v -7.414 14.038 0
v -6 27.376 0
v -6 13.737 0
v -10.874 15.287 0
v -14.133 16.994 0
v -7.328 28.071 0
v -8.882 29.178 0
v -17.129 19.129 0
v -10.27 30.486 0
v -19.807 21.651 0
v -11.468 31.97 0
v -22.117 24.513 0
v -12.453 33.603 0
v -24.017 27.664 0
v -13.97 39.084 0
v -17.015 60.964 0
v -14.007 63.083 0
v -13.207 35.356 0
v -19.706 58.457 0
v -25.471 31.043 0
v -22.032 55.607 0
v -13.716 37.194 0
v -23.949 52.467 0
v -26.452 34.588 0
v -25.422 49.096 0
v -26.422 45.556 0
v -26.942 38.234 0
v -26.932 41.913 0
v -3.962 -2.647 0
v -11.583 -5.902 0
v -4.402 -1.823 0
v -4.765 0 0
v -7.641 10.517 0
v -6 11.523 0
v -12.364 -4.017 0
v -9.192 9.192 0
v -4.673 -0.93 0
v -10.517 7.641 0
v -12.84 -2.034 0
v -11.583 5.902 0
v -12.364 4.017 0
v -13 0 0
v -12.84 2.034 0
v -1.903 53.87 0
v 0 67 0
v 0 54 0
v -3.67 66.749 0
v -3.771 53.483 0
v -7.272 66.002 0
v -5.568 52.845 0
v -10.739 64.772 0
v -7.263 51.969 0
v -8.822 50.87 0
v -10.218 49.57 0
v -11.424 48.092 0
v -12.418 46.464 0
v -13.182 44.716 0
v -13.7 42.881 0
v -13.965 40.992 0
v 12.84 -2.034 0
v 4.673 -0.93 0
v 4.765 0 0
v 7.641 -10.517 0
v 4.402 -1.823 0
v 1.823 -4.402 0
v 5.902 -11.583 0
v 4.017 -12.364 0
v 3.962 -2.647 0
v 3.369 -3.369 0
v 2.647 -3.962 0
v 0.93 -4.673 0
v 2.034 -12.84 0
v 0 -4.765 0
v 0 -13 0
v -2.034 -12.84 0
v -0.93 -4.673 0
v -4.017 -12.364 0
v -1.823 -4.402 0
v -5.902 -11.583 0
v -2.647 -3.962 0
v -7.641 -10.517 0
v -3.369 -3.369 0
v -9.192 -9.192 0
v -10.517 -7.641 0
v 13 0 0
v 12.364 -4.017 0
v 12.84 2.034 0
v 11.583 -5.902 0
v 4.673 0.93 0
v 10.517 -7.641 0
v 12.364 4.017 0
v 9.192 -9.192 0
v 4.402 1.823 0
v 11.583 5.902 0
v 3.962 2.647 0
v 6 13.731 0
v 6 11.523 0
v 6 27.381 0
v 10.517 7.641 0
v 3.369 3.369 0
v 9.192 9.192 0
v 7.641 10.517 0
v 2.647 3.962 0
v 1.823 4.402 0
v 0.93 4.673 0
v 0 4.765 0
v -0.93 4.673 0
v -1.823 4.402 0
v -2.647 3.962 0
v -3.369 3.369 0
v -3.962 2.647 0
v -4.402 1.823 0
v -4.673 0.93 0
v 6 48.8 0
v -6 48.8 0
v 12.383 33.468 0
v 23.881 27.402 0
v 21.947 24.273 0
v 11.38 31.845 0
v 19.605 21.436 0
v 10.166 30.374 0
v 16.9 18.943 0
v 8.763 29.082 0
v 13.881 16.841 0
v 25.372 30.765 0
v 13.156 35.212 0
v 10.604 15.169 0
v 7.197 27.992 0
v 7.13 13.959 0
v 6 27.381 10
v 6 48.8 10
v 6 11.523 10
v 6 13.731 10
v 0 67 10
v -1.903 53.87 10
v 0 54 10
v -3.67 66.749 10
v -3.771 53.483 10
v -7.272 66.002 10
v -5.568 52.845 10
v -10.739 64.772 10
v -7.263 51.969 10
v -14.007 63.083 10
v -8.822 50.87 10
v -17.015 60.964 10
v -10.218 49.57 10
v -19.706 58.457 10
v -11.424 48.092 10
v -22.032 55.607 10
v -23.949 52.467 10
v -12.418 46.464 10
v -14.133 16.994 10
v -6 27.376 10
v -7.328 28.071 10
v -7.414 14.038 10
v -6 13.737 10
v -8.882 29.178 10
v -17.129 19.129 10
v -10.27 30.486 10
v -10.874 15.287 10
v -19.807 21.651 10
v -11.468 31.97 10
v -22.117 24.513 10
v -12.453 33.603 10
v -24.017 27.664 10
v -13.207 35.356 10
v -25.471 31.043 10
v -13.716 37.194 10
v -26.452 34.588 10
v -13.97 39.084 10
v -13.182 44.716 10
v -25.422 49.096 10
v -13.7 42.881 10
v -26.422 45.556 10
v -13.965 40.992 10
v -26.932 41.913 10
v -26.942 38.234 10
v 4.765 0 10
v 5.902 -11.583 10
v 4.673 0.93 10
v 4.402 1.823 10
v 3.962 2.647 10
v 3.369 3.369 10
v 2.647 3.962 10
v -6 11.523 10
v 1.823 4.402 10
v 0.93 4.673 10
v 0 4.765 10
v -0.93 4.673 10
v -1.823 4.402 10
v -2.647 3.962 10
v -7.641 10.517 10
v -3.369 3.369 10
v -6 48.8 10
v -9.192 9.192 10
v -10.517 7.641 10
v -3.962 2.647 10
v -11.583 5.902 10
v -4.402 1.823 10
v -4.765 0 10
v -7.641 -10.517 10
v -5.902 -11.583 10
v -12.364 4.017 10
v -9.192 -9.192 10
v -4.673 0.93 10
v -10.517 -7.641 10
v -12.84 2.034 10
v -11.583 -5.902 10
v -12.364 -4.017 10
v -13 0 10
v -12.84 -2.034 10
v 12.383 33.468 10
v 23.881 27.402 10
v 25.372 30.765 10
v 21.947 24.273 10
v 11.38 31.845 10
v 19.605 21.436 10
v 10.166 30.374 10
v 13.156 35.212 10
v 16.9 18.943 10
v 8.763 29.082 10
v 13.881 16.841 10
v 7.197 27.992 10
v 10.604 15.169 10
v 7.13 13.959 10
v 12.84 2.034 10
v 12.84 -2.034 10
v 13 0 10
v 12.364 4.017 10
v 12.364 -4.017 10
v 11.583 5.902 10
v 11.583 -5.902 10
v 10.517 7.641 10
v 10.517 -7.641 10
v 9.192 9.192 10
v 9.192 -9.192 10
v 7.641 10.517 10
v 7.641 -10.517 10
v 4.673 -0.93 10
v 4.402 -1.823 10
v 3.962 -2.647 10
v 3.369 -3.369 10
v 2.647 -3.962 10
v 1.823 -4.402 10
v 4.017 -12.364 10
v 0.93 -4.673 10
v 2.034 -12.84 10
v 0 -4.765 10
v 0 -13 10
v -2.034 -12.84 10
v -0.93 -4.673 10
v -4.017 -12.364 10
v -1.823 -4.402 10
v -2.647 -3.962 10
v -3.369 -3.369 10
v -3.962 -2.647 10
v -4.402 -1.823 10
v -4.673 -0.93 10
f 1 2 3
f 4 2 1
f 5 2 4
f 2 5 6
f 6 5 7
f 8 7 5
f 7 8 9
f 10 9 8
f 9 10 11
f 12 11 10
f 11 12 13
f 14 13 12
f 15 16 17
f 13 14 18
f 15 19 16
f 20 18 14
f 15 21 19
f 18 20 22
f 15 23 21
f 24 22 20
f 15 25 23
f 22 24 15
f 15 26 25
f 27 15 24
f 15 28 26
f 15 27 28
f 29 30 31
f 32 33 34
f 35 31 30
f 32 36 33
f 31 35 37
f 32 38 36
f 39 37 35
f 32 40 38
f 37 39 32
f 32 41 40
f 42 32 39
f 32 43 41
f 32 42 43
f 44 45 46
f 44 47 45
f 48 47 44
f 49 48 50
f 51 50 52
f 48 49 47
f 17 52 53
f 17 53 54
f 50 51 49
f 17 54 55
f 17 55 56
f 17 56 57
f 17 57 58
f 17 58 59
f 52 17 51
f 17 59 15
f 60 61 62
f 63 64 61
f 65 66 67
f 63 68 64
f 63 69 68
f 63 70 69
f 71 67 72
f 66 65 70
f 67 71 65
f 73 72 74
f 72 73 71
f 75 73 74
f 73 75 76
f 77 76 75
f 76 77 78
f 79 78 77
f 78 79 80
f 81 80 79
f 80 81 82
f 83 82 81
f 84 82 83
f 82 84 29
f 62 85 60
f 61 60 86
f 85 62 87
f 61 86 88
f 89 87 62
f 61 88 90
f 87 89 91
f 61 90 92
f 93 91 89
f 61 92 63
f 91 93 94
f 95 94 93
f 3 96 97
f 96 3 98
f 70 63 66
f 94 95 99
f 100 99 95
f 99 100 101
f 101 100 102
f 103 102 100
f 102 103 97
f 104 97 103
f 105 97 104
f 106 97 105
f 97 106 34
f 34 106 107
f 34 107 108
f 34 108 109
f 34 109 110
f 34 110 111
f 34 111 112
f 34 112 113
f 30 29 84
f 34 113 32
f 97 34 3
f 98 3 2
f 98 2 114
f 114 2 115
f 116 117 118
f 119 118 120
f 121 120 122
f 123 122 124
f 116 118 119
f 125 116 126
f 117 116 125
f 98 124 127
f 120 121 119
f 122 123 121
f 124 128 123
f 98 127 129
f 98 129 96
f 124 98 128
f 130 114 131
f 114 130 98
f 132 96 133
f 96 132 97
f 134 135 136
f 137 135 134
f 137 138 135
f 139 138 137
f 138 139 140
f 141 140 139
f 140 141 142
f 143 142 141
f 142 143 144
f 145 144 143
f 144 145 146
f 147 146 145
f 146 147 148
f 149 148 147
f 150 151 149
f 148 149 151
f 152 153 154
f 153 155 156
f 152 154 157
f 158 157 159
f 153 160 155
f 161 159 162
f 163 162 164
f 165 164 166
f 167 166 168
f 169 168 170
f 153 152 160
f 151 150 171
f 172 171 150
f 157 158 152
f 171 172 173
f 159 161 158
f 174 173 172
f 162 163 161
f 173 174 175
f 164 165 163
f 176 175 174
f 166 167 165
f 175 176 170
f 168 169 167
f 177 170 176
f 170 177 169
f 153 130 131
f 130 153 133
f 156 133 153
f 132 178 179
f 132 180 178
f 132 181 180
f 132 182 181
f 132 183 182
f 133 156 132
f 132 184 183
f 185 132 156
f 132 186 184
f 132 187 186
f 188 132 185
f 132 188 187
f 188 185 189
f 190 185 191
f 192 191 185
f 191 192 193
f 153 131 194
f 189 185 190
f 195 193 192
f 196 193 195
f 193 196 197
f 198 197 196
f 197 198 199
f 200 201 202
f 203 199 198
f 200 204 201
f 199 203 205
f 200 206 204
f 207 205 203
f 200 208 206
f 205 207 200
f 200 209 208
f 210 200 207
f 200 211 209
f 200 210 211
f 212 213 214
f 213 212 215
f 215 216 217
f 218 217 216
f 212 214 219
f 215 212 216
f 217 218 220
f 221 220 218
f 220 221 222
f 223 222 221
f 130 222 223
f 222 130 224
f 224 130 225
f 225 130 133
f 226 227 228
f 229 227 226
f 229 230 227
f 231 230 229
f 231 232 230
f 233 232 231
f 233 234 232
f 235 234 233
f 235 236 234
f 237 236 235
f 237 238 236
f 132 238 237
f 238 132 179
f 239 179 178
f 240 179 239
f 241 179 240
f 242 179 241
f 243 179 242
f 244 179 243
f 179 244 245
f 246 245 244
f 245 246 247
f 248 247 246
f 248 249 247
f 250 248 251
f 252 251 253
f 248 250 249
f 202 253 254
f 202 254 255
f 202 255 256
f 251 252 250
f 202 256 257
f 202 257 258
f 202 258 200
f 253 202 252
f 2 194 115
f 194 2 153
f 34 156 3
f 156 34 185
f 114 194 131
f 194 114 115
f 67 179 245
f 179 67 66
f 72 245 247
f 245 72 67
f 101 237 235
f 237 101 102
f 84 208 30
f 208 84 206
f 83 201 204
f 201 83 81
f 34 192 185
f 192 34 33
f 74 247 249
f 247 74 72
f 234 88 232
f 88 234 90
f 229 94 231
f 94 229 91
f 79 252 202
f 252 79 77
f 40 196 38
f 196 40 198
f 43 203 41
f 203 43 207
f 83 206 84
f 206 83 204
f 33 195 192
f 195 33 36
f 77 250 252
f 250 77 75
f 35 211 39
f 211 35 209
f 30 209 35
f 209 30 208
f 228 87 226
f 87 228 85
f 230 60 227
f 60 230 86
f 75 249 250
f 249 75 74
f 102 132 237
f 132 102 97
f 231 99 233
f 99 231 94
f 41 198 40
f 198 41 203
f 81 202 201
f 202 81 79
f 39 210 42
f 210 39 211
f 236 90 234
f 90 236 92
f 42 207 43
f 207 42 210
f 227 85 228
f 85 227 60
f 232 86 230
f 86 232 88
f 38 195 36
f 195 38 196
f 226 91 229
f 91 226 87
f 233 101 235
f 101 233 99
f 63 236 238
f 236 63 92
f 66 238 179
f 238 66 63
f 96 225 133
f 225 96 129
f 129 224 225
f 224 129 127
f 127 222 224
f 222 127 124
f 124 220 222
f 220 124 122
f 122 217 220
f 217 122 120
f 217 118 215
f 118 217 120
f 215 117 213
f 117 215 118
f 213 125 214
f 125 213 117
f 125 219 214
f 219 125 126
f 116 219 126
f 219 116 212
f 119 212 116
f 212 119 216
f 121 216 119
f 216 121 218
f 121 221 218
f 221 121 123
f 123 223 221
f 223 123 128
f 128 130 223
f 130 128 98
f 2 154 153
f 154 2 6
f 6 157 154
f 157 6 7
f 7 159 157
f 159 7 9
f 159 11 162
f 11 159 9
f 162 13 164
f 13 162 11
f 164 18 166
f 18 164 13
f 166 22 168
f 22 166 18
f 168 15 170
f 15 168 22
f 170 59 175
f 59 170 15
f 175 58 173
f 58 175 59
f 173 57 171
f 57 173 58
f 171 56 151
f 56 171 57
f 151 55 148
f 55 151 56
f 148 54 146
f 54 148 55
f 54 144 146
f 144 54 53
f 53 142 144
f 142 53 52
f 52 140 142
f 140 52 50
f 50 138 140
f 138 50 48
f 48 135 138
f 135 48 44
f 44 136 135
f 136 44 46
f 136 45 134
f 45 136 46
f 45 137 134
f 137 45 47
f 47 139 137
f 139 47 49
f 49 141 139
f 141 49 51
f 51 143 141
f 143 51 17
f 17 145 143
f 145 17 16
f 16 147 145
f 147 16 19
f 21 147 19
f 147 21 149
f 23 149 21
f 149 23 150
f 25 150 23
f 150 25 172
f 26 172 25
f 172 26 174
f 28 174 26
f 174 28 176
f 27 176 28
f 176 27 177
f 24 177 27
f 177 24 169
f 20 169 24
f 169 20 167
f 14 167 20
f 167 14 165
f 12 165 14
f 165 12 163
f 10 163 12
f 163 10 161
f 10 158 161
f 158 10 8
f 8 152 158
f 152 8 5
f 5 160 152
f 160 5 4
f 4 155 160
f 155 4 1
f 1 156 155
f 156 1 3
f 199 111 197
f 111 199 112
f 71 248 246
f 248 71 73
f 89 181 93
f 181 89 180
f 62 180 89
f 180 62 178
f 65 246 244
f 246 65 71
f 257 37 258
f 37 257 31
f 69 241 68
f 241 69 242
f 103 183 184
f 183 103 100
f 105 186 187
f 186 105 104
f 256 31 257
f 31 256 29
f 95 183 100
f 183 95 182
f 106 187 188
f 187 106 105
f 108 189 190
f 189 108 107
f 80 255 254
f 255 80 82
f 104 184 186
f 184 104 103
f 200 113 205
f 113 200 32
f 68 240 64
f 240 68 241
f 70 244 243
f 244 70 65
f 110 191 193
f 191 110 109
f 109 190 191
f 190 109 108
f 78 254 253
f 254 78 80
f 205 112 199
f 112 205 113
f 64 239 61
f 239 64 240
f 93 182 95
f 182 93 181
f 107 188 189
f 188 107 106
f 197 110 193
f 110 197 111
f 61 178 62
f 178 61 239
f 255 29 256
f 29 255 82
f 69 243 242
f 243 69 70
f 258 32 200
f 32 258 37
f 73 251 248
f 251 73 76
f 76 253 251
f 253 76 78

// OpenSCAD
$fn = 32;
// ----------------------------------------------------------------------
// Hook: 80 mm shank into a 14 mm curl, 10 mm thick
// ----------------------------------------------------------------------

// --- parameters (mm) ---
shank_len = 80;           // shank length from the boss centre
shank_w = 12;             // shank width
boss_d = 26;              // boss diameter
bore_d = 9.53;            // boss bore
curl_in = 14;             // curl inner radius
curl_out = 27;            // curl outer radius
curl_sweep = 250;         // curl sweep angle
hook_t = 10;              // hook thickness

shank_profile = [[-6, 48.8], [6, 48.8], [6, 11], [-6, 11]];
boss_profile = [[13, 0], [12.84, 2.034], [12.364, 4.017], [11.583, 5.902], [10.517, 7.641], [9.192, 9.192], [7.641, 10.517], [5.902, 11.583], [4.017, 12.364], [2.034, 12.84], [0, 13], [-2.034, 12.84], [-4.017, 12.364], [-5.902, 11.583], [-7.641, 10.517], [-9.192, 9.192], [-10.517, 7.641], [-11.583, 5.902], [-12.364, 4.017], [-12.84, 2.034], [-13, 0], [-12.84, -2.034], [-12.364, -4.017], [-11.583, -5.902], [-10.517, -7.641], [-9.192, -9.192], [-7.641, -10.517], [-5.902, -11.583], [-4.017, -12.364], [-2.034, -12.84], [0, -13], [2.034, -12.84], [4.017, -12.364], [5.902, -11.583], [7.641, -10.517], [9.192, -9.192], [10.517, -7.641], [11.583, -5.902], [12.364, -4.017], [12.84, -2.034]];
curl_profile = [[0, 67], [-3.67, 66.749], [-7.272, 66.002], [-10.739, 64.772], [-14.007, 63.083], [-17.015, 60.964], [-19.706, 58.457], [-22.032, 55.607], [-23.949, 52.467], [-25.422, 49.096], [-26.422, 45.556], [-26.932, 41.913], [-26.942, 38.234], [-26.452, 34.588], [-25.471, 31.043], [-24.017, 27.664], [-22.117, 24.513], [-19.807, 21.651], [-17.129, 19.129], [-14.133, 16.994], [-10.874, 15.287], [-7.414, 14.038], [-3.816, 13.271], [-0.147, 13], [3.524, 13.231], [7.13, 13.959], [10.604, 15.169], [13.881, 16.841], [16.9, 18.943], [19.605, 21.436], [21.947, 24.273], [23.881, 27.402], [25.372, 30.765], [13.156, 35.212], [12.383, 33.468], [11.38, 31.845], [10.166, 30.374], [8.763, 29.082], [7.197, 27.992], [5.498, 27.125], [3.697, 26.497], [1.827, 26.12], [-0.076, 26], [-1.979, 26.141], [-3.844, 26.538], [-5.638, 27.186], [-7.328, 28.071], [-8.882, 29.178], [-10.27, 30.486], [-11.468, 31.97], [-12.453, 33.603], [-13.207, 35.356], [-13.716, 37.194], [-13.97, 39.084], [-13.965, 40.992], [-13.7, 42.881], [-13.182, 44.716], [-12.418, 46.464], [-11.424, 48.092], [-10.218, 49.57], [-8.822, 50.87], [-7.263, 51.969], [-5.568, 52.845], [-3.771, 53.483], [-1.903, 53.87], [0, 54]];

difference() {
  union() {
    /* three overlapping outlines: shank, boss and the smooth curl */
    linear_extrude(height = hook_t) polygon(shank_profile);
    linear_extrude(height = hook_t) polygon(boss_profile);
    linear_extrude(height = hook_t) polygon(curl_profile);
  }
  translate([0, 0, -2.5]) cylinder(h = hook_t + 5, d = bore_d);
}
